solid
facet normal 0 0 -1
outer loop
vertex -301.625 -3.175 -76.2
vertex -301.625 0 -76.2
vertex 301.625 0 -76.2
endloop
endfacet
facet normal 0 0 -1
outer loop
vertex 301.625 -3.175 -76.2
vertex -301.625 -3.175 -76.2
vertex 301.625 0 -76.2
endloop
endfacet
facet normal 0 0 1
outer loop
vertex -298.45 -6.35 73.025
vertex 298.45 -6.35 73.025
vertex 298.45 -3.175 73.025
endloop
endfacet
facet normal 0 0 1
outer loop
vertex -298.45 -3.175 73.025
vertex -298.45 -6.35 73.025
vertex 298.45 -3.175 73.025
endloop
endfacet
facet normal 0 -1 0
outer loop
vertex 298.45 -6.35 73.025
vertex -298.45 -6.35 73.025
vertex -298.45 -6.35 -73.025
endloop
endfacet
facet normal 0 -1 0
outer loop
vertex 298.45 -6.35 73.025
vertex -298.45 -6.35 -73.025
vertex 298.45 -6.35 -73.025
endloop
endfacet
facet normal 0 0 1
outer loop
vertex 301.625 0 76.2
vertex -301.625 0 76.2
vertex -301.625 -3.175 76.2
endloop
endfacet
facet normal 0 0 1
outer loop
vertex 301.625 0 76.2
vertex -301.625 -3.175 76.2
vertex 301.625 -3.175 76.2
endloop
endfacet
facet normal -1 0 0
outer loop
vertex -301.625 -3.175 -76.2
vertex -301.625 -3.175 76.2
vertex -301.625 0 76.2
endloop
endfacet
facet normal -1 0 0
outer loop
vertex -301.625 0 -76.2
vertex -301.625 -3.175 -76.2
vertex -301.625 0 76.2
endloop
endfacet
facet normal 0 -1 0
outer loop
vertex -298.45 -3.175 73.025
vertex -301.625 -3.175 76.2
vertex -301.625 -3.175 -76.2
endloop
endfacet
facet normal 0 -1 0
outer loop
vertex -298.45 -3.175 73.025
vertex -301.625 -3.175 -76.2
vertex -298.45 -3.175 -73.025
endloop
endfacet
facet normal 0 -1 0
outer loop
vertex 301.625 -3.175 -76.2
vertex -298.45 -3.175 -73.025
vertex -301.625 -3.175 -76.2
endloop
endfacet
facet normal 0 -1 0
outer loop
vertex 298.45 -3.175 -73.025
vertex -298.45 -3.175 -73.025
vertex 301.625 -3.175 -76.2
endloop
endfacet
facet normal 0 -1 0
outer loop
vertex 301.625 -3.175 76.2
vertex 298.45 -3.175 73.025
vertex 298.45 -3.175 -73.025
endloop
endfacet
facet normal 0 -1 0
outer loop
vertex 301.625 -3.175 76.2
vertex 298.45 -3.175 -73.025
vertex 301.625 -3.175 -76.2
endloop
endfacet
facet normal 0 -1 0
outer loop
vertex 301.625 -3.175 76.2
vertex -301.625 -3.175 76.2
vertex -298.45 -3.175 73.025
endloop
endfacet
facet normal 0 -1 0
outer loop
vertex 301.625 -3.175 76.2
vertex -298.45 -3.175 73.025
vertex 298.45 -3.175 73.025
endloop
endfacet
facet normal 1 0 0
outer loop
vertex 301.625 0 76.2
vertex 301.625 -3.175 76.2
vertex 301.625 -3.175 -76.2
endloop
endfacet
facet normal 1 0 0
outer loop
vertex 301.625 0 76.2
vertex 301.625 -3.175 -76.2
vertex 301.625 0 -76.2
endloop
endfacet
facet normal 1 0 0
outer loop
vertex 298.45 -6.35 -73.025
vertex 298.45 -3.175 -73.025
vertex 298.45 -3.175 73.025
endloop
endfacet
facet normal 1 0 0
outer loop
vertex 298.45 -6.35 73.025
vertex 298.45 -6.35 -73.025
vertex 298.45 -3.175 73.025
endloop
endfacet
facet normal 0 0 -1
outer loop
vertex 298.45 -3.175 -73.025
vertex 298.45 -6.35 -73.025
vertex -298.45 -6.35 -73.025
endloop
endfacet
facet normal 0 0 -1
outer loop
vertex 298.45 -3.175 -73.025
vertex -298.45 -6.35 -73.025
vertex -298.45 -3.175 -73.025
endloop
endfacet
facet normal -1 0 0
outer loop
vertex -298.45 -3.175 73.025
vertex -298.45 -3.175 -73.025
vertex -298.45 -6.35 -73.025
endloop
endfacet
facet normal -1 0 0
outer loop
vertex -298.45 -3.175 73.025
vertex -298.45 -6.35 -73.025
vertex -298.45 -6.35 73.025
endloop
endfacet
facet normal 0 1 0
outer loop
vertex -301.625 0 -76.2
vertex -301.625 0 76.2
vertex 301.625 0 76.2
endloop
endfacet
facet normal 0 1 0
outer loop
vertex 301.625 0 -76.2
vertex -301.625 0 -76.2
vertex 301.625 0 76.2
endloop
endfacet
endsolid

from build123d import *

# Parameters (mm, degrees)
F0_W     = 596.9
F0_H     = 152.4
F1_DEPTH = 6.35
F2_W     = 3.175
F2_H     = 3.175
F3_DEPTH = 596.901
F4_W     = 3.175
F4_H     = 3.175
F5_DEPTH = 152.4


with BuildPart() as f1:
    # F0 (on Front) → F1 (new body)
    with BuildSketch(Plane.XZ):
        Rectangle(F0_W, F0_H)
    extrude(amount=F1_DEPTH)

    # F2 (on face) → F3 (cut, through all)
    with BuildSketch(Plane.YZ.offset(298.45)):
        with Locations((-4.7625, -74.6125)):
            Rectangle(F2_W, F2_H)
        with Locations((-4.7625, 74.6125)):
            Rectangle(F2_W, F2_H)
    extrude(amount=-F3_DEPTH, mode=Mode.SUBTRACT)

    # F4 (on face) → F5 (join, through all)
    with BuildSketch(Plane.XY.offset(76.2)):
        with Locations((-300.0375, -1.5875)):
            Rectangle(F4_W, F4_H)
        with Locations((300.0375, -1.5875)):
            Rectangle(F4_W, F4_H)
    extrude(amount=-F5_DEPTH)


solid = f1.part
